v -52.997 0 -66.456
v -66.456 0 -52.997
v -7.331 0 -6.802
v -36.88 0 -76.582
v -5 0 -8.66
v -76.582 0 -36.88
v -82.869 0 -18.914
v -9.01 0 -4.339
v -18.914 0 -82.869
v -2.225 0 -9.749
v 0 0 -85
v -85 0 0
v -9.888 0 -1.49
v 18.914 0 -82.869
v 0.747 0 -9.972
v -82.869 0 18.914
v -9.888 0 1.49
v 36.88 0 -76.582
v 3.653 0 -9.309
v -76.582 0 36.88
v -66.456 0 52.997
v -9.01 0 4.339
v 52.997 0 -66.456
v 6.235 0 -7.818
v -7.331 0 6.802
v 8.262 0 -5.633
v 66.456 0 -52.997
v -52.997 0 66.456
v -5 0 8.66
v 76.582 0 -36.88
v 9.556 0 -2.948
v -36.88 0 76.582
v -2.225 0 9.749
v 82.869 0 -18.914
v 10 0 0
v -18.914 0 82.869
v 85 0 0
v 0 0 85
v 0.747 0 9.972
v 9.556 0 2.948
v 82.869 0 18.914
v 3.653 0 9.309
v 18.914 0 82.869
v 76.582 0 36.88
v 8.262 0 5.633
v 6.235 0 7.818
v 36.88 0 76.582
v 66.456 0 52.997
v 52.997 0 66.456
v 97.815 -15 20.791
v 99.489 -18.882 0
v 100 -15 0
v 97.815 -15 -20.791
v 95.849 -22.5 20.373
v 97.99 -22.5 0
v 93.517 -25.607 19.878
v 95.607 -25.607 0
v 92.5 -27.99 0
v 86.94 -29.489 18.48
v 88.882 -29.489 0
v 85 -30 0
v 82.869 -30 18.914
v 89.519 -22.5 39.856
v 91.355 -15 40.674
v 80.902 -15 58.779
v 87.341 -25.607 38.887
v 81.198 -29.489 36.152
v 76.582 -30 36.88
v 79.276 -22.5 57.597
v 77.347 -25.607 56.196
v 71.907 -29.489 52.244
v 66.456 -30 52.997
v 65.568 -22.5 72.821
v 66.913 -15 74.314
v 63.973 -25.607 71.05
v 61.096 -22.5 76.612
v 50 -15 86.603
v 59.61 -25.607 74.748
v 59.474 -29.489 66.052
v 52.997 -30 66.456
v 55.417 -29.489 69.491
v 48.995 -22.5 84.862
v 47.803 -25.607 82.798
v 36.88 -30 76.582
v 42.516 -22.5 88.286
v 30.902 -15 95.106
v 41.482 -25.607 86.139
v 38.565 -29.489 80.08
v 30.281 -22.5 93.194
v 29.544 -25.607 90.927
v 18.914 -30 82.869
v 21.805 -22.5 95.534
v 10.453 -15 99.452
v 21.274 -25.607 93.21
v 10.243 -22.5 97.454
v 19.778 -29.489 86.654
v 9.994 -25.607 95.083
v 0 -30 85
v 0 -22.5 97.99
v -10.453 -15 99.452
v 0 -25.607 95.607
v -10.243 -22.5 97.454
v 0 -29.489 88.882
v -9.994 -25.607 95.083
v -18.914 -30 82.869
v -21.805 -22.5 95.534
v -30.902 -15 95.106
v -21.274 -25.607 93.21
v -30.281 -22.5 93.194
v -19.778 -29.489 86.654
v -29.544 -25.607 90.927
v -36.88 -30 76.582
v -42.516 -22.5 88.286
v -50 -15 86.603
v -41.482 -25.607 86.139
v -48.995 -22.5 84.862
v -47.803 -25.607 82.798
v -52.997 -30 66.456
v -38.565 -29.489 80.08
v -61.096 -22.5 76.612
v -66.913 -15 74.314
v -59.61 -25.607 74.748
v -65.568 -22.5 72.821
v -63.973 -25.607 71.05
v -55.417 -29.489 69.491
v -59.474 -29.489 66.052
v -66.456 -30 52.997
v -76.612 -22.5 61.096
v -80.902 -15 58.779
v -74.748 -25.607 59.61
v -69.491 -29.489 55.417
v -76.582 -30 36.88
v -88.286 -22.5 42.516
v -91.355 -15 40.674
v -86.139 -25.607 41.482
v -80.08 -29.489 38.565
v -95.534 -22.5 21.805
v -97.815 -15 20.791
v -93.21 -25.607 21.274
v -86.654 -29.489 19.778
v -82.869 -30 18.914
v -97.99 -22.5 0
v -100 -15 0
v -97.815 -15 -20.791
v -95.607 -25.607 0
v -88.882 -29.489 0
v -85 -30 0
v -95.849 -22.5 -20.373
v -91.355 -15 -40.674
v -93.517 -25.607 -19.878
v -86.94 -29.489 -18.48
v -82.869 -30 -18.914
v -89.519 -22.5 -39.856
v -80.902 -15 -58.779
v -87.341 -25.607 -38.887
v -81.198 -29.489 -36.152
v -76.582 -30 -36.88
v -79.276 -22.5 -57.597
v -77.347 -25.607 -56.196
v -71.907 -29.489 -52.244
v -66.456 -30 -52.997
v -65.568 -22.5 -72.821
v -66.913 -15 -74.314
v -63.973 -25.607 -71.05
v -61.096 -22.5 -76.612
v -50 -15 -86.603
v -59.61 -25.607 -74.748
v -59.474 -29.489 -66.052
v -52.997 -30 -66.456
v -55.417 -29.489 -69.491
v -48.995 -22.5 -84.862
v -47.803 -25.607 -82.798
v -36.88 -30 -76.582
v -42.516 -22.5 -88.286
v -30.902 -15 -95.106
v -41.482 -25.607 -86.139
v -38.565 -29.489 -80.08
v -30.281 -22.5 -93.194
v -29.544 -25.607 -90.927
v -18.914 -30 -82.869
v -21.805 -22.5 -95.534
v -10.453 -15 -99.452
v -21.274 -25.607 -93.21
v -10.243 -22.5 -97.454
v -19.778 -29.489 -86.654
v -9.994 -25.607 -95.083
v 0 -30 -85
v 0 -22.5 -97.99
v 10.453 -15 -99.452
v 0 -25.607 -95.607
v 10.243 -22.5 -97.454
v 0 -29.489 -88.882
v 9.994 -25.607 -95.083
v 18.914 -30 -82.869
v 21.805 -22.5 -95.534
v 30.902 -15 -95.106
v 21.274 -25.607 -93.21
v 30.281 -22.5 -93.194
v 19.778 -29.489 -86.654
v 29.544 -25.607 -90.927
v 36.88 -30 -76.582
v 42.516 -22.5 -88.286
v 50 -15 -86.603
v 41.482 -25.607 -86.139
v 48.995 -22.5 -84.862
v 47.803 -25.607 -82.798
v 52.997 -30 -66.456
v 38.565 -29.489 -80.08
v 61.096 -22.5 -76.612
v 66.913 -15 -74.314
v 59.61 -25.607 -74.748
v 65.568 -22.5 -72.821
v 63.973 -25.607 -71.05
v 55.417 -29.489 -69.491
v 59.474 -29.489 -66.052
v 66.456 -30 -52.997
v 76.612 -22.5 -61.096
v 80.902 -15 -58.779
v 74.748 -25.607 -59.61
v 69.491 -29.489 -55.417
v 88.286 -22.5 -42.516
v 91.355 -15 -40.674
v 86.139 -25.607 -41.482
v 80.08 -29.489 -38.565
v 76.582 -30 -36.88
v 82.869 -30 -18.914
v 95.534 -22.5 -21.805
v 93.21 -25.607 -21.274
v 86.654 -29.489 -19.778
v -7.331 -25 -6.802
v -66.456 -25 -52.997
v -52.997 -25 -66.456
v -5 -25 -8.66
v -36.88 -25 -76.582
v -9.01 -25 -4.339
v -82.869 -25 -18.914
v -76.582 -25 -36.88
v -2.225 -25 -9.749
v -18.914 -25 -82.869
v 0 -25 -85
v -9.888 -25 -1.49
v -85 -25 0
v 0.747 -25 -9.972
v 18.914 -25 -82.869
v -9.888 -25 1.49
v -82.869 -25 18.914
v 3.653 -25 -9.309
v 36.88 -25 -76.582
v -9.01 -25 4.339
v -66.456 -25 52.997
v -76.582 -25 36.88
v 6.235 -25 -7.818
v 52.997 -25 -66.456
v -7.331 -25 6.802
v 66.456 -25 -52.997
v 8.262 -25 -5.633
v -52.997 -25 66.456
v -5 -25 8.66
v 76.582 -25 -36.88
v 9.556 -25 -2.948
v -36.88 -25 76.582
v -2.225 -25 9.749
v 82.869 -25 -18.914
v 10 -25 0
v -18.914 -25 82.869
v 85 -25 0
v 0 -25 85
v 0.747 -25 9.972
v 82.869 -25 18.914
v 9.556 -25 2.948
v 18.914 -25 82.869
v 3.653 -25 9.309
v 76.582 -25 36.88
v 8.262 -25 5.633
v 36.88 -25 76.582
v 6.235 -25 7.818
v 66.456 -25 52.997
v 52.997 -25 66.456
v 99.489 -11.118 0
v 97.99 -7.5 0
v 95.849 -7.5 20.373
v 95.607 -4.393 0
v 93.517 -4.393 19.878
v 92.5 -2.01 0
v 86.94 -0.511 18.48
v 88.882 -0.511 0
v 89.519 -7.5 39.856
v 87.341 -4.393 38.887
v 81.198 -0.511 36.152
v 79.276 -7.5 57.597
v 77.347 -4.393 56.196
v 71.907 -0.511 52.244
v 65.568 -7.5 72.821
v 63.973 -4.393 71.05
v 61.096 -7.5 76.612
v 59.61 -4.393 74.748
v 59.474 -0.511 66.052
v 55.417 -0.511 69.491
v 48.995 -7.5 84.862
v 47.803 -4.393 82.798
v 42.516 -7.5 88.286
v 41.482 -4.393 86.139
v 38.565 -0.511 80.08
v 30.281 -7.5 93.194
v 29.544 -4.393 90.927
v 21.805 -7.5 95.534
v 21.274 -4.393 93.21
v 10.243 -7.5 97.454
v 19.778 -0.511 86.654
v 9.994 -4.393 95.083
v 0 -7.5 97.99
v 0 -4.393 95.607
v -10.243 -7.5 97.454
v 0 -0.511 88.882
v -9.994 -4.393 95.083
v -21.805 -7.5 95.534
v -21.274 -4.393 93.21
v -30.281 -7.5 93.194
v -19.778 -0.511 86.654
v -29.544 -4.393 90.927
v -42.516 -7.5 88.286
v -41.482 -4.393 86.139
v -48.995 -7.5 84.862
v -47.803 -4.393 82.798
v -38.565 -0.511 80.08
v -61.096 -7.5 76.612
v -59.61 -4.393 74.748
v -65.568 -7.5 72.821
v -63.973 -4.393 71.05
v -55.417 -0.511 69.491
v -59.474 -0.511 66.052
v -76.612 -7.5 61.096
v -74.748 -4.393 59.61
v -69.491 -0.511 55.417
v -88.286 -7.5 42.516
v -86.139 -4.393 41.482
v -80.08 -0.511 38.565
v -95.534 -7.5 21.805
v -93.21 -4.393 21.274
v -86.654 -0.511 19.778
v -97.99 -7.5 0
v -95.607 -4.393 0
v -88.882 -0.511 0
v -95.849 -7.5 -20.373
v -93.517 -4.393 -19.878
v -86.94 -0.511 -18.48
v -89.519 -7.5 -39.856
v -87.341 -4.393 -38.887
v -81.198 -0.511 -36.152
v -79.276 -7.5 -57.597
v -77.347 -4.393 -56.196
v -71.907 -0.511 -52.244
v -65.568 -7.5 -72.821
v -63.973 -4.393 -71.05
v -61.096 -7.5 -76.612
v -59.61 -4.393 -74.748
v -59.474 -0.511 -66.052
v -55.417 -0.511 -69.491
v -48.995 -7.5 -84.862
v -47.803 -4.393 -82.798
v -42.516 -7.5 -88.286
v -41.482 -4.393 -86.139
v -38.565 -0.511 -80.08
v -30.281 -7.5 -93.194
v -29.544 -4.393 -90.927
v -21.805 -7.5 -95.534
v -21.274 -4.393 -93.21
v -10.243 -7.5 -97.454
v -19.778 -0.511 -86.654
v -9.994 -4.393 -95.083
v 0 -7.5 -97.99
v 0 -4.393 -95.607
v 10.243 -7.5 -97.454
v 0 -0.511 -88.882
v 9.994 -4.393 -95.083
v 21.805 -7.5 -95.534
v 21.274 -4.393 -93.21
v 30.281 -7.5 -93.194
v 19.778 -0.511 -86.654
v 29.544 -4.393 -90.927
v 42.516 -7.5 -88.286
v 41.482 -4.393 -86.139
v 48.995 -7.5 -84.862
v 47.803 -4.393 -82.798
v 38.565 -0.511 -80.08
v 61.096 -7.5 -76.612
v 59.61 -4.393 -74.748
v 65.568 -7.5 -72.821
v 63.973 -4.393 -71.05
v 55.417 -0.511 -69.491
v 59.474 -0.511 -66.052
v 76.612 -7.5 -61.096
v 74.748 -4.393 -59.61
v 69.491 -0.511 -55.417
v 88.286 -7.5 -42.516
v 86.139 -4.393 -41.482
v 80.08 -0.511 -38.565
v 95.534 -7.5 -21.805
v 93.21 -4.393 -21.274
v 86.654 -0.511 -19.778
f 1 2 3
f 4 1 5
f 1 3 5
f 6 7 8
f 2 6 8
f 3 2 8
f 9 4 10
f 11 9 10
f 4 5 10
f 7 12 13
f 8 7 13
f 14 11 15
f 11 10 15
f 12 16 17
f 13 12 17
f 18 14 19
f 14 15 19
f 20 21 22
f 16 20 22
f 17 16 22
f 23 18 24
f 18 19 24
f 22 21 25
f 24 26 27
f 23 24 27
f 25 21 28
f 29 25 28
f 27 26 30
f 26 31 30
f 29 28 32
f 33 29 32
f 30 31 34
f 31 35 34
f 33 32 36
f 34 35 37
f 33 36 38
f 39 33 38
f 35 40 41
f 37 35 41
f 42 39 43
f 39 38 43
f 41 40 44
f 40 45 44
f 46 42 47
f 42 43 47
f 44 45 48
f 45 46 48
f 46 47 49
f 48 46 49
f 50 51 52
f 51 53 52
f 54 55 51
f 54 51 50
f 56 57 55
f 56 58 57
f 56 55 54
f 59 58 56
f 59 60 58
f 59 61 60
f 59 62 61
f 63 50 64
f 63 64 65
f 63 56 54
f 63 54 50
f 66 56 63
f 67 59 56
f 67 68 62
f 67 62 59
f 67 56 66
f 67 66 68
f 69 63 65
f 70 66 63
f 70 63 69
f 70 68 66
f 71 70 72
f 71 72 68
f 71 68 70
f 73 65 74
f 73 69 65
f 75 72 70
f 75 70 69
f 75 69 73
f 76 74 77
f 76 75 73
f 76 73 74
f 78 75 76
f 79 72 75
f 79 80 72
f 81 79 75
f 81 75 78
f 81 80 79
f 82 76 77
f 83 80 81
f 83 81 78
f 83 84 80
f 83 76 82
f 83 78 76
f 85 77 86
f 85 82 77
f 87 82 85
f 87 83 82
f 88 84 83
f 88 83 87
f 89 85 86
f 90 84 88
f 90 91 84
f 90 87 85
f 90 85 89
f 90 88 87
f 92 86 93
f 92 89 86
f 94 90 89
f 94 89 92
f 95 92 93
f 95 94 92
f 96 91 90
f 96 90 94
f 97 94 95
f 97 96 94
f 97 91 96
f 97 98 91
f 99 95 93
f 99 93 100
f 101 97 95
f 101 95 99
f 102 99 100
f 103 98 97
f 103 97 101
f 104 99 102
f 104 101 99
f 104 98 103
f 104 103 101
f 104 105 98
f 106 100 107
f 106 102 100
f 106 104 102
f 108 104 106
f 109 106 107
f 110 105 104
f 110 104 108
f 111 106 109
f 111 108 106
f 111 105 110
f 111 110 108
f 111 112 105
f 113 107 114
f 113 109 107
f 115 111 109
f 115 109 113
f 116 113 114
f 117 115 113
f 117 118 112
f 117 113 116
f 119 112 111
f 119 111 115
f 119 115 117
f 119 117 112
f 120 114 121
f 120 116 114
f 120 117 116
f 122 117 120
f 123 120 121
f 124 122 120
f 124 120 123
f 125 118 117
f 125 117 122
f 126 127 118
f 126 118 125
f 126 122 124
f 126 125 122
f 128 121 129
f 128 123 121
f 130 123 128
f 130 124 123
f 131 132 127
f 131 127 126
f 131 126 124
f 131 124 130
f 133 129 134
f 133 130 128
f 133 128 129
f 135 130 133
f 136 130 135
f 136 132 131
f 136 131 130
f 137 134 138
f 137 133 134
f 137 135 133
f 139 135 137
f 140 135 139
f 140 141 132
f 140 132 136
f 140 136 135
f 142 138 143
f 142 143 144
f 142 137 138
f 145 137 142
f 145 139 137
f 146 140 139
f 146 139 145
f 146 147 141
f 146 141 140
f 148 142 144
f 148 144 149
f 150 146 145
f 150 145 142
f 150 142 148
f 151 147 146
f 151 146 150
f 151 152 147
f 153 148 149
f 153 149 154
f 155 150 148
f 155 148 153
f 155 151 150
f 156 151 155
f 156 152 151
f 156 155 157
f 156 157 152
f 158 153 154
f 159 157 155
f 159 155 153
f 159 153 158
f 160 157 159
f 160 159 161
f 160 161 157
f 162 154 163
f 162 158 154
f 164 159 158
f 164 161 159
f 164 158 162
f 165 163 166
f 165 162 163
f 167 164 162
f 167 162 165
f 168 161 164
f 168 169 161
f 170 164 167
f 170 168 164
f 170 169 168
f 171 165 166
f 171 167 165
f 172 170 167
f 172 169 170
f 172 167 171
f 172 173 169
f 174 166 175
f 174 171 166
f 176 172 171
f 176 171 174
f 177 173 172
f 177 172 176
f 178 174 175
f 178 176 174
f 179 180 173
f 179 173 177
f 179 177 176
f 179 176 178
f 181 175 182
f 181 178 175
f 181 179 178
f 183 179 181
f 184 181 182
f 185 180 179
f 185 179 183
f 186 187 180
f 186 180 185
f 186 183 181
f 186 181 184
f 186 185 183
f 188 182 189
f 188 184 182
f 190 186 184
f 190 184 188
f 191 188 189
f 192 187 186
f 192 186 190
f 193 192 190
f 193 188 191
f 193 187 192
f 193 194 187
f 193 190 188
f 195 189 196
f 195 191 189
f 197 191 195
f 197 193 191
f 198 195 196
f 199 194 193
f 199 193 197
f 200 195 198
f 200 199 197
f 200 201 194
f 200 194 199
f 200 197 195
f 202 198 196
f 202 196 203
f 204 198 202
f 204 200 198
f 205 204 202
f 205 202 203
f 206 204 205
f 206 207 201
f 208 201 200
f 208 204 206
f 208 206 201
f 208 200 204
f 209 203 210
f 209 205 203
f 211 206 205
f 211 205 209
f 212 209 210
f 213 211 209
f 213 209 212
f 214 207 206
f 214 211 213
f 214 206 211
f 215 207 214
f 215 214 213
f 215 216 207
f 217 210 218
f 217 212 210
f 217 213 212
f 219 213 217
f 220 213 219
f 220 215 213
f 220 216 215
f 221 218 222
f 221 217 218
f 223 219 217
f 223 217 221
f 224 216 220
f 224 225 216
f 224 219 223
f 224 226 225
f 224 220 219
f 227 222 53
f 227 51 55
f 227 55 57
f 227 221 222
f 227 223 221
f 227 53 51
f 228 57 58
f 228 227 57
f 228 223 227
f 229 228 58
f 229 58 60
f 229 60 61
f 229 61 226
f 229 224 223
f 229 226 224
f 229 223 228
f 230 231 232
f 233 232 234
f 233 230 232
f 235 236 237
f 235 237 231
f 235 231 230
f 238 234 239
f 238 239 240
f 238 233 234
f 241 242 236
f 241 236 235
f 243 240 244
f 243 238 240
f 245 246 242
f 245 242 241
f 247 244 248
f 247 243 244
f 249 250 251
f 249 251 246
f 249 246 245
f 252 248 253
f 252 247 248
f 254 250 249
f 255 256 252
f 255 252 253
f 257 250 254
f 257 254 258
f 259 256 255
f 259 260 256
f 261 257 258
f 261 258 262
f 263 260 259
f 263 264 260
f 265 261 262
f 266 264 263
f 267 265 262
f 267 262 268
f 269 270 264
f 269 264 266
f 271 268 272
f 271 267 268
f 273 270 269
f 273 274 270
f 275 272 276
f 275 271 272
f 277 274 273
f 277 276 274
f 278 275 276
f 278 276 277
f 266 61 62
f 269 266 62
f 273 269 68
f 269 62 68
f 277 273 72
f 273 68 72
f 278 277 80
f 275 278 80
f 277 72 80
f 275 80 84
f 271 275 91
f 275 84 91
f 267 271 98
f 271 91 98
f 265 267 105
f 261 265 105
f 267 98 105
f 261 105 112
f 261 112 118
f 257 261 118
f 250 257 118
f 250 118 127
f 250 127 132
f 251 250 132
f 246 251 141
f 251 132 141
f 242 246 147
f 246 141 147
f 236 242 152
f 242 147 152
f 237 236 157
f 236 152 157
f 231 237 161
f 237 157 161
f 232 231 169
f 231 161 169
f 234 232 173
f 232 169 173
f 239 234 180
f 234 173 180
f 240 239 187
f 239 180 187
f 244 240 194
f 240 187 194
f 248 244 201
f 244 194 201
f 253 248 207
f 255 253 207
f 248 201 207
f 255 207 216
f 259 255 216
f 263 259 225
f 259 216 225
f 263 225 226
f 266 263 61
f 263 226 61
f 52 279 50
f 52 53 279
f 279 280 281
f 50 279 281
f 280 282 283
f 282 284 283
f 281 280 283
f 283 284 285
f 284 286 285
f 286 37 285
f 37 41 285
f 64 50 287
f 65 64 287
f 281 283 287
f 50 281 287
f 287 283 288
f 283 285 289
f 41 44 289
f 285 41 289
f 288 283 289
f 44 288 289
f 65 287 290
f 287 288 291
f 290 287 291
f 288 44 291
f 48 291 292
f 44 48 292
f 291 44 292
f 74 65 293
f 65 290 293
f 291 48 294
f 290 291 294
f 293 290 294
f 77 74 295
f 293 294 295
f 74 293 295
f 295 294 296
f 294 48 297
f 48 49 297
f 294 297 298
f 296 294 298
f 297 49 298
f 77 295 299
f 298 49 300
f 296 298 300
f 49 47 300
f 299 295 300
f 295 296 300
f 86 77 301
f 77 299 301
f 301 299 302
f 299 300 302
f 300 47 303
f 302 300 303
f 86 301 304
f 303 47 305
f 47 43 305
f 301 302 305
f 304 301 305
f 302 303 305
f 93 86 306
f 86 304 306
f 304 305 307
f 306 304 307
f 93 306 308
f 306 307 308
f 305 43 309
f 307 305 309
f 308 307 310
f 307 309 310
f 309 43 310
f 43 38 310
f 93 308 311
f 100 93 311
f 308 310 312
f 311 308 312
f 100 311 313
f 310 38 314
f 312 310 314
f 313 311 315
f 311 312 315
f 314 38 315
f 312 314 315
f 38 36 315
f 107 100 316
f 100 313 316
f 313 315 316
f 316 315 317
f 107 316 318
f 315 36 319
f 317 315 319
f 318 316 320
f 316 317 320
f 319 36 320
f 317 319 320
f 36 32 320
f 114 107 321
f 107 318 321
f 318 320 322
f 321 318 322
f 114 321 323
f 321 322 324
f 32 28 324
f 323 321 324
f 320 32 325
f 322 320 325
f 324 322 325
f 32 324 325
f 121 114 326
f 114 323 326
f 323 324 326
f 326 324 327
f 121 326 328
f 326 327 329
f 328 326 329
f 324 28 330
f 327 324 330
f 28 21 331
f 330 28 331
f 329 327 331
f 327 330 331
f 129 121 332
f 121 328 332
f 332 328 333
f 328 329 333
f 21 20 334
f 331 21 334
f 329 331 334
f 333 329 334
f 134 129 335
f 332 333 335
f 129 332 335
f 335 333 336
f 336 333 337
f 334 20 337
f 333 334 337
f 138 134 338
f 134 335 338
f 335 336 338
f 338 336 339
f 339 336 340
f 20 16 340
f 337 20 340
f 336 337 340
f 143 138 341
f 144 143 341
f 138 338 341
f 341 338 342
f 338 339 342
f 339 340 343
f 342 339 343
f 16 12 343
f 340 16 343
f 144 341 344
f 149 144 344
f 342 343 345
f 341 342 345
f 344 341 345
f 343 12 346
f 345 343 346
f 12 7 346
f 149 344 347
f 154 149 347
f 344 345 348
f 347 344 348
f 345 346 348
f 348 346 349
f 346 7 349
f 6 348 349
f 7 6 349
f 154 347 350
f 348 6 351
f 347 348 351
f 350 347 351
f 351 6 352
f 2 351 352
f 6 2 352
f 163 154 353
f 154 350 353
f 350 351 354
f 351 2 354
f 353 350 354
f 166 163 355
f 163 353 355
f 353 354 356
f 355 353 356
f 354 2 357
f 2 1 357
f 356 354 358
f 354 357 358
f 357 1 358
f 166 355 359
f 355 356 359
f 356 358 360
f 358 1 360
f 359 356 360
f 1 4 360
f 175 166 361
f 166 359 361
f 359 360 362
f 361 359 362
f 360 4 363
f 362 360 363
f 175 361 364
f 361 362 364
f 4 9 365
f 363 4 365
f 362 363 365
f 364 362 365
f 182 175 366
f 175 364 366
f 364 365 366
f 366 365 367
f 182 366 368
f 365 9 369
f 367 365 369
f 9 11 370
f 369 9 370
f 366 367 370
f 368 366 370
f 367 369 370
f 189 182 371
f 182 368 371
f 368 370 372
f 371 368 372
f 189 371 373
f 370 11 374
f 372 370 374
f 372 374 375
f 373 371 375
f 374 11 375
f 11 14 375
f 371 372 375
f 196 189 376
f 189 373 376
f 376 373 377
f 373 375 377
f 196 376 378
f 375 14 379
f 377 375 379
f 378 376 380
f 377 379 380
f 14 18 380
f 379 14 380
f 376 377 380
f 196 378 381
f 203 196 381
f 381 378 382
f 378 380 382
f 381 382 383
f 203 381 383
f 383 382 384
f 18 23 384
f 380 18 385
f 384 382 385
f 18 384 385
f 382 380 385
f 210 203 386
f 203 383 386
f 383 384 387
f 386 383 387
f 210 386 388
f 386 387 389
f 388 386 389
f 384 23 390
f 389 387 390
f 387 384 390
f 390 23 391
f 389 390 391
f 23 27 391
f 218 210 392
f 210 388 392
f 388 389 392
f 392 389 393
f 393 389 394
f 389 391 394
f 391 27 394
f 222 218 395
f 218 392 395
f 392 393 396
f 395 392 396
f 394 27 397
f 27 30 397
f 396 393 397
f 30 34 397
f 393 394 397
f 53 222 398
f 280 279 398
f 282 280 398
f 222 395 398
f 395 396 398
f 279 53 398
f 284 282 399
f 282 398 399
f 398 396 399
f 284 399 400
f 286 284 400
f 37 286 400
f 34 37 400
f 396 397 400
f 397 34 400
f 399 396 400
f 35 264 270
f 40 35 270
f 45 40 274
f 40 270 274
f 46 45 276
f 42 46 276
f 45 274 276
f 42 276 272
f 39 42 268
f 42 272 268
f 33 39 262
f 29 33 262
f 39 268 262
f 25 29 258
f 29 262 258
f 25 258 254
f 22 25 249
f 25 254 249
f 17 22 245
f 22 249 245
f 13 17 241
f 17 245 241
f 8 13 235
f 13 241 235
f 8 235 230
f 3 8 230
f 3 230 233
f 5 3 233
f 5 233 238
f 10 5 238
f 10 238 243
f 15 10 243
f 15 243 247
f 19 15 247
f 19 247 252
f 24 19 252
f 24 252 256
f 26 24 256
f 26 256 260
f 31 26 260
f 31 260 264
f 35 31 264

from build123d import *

# Parameters (mm, degrees)
F0_R     = 100
F1_DEPTH = 30
F2_R     = 14.99999
F3_DEPTH = 5
F4_R     = 10
F5_DEPTH = 25.001


# Not quite as in the source:
# - a fillet or chamfer is up to 0.001 mm smaller than in the source, because OpenCascade refuses the exact size


with BuildPart() as f1:
    # F0 (on Front) → F1 (new body)
    with BuildSketch(Plane.XZ):
        Circle(F0_R)
    extrude(amount=F1_DEPTH)

    # F2 (radius 15 in the source; OpenCascade refuses exactly that, so slightly less here)
    f2_edges = [f1.edges().sort_by_distance(p)[0] for p in [
        (-100, -30, 0),
        (-100, 0, 0),
    ]]
    fillet(f2_edges, radius=F2_R)

    # F3 (cut): a face of the model
    f3_faces = [f1.faces().sort_by_distance(p)[0] for p in [
        (0, -30, 0),
    ]]
    extrude(f3_faces, amount=-F3_DEPTH, mode=Mode.SUBTRACT)

    # F4 (on face) → F5 (cut, through all)
    with BuildSketch(Plane.XZ.offset(25)):
        Circle(F4_R)
    extrude(amount=-F5_DEPTH, mode=Mode.SUBTRACT)


solid = f1.part
